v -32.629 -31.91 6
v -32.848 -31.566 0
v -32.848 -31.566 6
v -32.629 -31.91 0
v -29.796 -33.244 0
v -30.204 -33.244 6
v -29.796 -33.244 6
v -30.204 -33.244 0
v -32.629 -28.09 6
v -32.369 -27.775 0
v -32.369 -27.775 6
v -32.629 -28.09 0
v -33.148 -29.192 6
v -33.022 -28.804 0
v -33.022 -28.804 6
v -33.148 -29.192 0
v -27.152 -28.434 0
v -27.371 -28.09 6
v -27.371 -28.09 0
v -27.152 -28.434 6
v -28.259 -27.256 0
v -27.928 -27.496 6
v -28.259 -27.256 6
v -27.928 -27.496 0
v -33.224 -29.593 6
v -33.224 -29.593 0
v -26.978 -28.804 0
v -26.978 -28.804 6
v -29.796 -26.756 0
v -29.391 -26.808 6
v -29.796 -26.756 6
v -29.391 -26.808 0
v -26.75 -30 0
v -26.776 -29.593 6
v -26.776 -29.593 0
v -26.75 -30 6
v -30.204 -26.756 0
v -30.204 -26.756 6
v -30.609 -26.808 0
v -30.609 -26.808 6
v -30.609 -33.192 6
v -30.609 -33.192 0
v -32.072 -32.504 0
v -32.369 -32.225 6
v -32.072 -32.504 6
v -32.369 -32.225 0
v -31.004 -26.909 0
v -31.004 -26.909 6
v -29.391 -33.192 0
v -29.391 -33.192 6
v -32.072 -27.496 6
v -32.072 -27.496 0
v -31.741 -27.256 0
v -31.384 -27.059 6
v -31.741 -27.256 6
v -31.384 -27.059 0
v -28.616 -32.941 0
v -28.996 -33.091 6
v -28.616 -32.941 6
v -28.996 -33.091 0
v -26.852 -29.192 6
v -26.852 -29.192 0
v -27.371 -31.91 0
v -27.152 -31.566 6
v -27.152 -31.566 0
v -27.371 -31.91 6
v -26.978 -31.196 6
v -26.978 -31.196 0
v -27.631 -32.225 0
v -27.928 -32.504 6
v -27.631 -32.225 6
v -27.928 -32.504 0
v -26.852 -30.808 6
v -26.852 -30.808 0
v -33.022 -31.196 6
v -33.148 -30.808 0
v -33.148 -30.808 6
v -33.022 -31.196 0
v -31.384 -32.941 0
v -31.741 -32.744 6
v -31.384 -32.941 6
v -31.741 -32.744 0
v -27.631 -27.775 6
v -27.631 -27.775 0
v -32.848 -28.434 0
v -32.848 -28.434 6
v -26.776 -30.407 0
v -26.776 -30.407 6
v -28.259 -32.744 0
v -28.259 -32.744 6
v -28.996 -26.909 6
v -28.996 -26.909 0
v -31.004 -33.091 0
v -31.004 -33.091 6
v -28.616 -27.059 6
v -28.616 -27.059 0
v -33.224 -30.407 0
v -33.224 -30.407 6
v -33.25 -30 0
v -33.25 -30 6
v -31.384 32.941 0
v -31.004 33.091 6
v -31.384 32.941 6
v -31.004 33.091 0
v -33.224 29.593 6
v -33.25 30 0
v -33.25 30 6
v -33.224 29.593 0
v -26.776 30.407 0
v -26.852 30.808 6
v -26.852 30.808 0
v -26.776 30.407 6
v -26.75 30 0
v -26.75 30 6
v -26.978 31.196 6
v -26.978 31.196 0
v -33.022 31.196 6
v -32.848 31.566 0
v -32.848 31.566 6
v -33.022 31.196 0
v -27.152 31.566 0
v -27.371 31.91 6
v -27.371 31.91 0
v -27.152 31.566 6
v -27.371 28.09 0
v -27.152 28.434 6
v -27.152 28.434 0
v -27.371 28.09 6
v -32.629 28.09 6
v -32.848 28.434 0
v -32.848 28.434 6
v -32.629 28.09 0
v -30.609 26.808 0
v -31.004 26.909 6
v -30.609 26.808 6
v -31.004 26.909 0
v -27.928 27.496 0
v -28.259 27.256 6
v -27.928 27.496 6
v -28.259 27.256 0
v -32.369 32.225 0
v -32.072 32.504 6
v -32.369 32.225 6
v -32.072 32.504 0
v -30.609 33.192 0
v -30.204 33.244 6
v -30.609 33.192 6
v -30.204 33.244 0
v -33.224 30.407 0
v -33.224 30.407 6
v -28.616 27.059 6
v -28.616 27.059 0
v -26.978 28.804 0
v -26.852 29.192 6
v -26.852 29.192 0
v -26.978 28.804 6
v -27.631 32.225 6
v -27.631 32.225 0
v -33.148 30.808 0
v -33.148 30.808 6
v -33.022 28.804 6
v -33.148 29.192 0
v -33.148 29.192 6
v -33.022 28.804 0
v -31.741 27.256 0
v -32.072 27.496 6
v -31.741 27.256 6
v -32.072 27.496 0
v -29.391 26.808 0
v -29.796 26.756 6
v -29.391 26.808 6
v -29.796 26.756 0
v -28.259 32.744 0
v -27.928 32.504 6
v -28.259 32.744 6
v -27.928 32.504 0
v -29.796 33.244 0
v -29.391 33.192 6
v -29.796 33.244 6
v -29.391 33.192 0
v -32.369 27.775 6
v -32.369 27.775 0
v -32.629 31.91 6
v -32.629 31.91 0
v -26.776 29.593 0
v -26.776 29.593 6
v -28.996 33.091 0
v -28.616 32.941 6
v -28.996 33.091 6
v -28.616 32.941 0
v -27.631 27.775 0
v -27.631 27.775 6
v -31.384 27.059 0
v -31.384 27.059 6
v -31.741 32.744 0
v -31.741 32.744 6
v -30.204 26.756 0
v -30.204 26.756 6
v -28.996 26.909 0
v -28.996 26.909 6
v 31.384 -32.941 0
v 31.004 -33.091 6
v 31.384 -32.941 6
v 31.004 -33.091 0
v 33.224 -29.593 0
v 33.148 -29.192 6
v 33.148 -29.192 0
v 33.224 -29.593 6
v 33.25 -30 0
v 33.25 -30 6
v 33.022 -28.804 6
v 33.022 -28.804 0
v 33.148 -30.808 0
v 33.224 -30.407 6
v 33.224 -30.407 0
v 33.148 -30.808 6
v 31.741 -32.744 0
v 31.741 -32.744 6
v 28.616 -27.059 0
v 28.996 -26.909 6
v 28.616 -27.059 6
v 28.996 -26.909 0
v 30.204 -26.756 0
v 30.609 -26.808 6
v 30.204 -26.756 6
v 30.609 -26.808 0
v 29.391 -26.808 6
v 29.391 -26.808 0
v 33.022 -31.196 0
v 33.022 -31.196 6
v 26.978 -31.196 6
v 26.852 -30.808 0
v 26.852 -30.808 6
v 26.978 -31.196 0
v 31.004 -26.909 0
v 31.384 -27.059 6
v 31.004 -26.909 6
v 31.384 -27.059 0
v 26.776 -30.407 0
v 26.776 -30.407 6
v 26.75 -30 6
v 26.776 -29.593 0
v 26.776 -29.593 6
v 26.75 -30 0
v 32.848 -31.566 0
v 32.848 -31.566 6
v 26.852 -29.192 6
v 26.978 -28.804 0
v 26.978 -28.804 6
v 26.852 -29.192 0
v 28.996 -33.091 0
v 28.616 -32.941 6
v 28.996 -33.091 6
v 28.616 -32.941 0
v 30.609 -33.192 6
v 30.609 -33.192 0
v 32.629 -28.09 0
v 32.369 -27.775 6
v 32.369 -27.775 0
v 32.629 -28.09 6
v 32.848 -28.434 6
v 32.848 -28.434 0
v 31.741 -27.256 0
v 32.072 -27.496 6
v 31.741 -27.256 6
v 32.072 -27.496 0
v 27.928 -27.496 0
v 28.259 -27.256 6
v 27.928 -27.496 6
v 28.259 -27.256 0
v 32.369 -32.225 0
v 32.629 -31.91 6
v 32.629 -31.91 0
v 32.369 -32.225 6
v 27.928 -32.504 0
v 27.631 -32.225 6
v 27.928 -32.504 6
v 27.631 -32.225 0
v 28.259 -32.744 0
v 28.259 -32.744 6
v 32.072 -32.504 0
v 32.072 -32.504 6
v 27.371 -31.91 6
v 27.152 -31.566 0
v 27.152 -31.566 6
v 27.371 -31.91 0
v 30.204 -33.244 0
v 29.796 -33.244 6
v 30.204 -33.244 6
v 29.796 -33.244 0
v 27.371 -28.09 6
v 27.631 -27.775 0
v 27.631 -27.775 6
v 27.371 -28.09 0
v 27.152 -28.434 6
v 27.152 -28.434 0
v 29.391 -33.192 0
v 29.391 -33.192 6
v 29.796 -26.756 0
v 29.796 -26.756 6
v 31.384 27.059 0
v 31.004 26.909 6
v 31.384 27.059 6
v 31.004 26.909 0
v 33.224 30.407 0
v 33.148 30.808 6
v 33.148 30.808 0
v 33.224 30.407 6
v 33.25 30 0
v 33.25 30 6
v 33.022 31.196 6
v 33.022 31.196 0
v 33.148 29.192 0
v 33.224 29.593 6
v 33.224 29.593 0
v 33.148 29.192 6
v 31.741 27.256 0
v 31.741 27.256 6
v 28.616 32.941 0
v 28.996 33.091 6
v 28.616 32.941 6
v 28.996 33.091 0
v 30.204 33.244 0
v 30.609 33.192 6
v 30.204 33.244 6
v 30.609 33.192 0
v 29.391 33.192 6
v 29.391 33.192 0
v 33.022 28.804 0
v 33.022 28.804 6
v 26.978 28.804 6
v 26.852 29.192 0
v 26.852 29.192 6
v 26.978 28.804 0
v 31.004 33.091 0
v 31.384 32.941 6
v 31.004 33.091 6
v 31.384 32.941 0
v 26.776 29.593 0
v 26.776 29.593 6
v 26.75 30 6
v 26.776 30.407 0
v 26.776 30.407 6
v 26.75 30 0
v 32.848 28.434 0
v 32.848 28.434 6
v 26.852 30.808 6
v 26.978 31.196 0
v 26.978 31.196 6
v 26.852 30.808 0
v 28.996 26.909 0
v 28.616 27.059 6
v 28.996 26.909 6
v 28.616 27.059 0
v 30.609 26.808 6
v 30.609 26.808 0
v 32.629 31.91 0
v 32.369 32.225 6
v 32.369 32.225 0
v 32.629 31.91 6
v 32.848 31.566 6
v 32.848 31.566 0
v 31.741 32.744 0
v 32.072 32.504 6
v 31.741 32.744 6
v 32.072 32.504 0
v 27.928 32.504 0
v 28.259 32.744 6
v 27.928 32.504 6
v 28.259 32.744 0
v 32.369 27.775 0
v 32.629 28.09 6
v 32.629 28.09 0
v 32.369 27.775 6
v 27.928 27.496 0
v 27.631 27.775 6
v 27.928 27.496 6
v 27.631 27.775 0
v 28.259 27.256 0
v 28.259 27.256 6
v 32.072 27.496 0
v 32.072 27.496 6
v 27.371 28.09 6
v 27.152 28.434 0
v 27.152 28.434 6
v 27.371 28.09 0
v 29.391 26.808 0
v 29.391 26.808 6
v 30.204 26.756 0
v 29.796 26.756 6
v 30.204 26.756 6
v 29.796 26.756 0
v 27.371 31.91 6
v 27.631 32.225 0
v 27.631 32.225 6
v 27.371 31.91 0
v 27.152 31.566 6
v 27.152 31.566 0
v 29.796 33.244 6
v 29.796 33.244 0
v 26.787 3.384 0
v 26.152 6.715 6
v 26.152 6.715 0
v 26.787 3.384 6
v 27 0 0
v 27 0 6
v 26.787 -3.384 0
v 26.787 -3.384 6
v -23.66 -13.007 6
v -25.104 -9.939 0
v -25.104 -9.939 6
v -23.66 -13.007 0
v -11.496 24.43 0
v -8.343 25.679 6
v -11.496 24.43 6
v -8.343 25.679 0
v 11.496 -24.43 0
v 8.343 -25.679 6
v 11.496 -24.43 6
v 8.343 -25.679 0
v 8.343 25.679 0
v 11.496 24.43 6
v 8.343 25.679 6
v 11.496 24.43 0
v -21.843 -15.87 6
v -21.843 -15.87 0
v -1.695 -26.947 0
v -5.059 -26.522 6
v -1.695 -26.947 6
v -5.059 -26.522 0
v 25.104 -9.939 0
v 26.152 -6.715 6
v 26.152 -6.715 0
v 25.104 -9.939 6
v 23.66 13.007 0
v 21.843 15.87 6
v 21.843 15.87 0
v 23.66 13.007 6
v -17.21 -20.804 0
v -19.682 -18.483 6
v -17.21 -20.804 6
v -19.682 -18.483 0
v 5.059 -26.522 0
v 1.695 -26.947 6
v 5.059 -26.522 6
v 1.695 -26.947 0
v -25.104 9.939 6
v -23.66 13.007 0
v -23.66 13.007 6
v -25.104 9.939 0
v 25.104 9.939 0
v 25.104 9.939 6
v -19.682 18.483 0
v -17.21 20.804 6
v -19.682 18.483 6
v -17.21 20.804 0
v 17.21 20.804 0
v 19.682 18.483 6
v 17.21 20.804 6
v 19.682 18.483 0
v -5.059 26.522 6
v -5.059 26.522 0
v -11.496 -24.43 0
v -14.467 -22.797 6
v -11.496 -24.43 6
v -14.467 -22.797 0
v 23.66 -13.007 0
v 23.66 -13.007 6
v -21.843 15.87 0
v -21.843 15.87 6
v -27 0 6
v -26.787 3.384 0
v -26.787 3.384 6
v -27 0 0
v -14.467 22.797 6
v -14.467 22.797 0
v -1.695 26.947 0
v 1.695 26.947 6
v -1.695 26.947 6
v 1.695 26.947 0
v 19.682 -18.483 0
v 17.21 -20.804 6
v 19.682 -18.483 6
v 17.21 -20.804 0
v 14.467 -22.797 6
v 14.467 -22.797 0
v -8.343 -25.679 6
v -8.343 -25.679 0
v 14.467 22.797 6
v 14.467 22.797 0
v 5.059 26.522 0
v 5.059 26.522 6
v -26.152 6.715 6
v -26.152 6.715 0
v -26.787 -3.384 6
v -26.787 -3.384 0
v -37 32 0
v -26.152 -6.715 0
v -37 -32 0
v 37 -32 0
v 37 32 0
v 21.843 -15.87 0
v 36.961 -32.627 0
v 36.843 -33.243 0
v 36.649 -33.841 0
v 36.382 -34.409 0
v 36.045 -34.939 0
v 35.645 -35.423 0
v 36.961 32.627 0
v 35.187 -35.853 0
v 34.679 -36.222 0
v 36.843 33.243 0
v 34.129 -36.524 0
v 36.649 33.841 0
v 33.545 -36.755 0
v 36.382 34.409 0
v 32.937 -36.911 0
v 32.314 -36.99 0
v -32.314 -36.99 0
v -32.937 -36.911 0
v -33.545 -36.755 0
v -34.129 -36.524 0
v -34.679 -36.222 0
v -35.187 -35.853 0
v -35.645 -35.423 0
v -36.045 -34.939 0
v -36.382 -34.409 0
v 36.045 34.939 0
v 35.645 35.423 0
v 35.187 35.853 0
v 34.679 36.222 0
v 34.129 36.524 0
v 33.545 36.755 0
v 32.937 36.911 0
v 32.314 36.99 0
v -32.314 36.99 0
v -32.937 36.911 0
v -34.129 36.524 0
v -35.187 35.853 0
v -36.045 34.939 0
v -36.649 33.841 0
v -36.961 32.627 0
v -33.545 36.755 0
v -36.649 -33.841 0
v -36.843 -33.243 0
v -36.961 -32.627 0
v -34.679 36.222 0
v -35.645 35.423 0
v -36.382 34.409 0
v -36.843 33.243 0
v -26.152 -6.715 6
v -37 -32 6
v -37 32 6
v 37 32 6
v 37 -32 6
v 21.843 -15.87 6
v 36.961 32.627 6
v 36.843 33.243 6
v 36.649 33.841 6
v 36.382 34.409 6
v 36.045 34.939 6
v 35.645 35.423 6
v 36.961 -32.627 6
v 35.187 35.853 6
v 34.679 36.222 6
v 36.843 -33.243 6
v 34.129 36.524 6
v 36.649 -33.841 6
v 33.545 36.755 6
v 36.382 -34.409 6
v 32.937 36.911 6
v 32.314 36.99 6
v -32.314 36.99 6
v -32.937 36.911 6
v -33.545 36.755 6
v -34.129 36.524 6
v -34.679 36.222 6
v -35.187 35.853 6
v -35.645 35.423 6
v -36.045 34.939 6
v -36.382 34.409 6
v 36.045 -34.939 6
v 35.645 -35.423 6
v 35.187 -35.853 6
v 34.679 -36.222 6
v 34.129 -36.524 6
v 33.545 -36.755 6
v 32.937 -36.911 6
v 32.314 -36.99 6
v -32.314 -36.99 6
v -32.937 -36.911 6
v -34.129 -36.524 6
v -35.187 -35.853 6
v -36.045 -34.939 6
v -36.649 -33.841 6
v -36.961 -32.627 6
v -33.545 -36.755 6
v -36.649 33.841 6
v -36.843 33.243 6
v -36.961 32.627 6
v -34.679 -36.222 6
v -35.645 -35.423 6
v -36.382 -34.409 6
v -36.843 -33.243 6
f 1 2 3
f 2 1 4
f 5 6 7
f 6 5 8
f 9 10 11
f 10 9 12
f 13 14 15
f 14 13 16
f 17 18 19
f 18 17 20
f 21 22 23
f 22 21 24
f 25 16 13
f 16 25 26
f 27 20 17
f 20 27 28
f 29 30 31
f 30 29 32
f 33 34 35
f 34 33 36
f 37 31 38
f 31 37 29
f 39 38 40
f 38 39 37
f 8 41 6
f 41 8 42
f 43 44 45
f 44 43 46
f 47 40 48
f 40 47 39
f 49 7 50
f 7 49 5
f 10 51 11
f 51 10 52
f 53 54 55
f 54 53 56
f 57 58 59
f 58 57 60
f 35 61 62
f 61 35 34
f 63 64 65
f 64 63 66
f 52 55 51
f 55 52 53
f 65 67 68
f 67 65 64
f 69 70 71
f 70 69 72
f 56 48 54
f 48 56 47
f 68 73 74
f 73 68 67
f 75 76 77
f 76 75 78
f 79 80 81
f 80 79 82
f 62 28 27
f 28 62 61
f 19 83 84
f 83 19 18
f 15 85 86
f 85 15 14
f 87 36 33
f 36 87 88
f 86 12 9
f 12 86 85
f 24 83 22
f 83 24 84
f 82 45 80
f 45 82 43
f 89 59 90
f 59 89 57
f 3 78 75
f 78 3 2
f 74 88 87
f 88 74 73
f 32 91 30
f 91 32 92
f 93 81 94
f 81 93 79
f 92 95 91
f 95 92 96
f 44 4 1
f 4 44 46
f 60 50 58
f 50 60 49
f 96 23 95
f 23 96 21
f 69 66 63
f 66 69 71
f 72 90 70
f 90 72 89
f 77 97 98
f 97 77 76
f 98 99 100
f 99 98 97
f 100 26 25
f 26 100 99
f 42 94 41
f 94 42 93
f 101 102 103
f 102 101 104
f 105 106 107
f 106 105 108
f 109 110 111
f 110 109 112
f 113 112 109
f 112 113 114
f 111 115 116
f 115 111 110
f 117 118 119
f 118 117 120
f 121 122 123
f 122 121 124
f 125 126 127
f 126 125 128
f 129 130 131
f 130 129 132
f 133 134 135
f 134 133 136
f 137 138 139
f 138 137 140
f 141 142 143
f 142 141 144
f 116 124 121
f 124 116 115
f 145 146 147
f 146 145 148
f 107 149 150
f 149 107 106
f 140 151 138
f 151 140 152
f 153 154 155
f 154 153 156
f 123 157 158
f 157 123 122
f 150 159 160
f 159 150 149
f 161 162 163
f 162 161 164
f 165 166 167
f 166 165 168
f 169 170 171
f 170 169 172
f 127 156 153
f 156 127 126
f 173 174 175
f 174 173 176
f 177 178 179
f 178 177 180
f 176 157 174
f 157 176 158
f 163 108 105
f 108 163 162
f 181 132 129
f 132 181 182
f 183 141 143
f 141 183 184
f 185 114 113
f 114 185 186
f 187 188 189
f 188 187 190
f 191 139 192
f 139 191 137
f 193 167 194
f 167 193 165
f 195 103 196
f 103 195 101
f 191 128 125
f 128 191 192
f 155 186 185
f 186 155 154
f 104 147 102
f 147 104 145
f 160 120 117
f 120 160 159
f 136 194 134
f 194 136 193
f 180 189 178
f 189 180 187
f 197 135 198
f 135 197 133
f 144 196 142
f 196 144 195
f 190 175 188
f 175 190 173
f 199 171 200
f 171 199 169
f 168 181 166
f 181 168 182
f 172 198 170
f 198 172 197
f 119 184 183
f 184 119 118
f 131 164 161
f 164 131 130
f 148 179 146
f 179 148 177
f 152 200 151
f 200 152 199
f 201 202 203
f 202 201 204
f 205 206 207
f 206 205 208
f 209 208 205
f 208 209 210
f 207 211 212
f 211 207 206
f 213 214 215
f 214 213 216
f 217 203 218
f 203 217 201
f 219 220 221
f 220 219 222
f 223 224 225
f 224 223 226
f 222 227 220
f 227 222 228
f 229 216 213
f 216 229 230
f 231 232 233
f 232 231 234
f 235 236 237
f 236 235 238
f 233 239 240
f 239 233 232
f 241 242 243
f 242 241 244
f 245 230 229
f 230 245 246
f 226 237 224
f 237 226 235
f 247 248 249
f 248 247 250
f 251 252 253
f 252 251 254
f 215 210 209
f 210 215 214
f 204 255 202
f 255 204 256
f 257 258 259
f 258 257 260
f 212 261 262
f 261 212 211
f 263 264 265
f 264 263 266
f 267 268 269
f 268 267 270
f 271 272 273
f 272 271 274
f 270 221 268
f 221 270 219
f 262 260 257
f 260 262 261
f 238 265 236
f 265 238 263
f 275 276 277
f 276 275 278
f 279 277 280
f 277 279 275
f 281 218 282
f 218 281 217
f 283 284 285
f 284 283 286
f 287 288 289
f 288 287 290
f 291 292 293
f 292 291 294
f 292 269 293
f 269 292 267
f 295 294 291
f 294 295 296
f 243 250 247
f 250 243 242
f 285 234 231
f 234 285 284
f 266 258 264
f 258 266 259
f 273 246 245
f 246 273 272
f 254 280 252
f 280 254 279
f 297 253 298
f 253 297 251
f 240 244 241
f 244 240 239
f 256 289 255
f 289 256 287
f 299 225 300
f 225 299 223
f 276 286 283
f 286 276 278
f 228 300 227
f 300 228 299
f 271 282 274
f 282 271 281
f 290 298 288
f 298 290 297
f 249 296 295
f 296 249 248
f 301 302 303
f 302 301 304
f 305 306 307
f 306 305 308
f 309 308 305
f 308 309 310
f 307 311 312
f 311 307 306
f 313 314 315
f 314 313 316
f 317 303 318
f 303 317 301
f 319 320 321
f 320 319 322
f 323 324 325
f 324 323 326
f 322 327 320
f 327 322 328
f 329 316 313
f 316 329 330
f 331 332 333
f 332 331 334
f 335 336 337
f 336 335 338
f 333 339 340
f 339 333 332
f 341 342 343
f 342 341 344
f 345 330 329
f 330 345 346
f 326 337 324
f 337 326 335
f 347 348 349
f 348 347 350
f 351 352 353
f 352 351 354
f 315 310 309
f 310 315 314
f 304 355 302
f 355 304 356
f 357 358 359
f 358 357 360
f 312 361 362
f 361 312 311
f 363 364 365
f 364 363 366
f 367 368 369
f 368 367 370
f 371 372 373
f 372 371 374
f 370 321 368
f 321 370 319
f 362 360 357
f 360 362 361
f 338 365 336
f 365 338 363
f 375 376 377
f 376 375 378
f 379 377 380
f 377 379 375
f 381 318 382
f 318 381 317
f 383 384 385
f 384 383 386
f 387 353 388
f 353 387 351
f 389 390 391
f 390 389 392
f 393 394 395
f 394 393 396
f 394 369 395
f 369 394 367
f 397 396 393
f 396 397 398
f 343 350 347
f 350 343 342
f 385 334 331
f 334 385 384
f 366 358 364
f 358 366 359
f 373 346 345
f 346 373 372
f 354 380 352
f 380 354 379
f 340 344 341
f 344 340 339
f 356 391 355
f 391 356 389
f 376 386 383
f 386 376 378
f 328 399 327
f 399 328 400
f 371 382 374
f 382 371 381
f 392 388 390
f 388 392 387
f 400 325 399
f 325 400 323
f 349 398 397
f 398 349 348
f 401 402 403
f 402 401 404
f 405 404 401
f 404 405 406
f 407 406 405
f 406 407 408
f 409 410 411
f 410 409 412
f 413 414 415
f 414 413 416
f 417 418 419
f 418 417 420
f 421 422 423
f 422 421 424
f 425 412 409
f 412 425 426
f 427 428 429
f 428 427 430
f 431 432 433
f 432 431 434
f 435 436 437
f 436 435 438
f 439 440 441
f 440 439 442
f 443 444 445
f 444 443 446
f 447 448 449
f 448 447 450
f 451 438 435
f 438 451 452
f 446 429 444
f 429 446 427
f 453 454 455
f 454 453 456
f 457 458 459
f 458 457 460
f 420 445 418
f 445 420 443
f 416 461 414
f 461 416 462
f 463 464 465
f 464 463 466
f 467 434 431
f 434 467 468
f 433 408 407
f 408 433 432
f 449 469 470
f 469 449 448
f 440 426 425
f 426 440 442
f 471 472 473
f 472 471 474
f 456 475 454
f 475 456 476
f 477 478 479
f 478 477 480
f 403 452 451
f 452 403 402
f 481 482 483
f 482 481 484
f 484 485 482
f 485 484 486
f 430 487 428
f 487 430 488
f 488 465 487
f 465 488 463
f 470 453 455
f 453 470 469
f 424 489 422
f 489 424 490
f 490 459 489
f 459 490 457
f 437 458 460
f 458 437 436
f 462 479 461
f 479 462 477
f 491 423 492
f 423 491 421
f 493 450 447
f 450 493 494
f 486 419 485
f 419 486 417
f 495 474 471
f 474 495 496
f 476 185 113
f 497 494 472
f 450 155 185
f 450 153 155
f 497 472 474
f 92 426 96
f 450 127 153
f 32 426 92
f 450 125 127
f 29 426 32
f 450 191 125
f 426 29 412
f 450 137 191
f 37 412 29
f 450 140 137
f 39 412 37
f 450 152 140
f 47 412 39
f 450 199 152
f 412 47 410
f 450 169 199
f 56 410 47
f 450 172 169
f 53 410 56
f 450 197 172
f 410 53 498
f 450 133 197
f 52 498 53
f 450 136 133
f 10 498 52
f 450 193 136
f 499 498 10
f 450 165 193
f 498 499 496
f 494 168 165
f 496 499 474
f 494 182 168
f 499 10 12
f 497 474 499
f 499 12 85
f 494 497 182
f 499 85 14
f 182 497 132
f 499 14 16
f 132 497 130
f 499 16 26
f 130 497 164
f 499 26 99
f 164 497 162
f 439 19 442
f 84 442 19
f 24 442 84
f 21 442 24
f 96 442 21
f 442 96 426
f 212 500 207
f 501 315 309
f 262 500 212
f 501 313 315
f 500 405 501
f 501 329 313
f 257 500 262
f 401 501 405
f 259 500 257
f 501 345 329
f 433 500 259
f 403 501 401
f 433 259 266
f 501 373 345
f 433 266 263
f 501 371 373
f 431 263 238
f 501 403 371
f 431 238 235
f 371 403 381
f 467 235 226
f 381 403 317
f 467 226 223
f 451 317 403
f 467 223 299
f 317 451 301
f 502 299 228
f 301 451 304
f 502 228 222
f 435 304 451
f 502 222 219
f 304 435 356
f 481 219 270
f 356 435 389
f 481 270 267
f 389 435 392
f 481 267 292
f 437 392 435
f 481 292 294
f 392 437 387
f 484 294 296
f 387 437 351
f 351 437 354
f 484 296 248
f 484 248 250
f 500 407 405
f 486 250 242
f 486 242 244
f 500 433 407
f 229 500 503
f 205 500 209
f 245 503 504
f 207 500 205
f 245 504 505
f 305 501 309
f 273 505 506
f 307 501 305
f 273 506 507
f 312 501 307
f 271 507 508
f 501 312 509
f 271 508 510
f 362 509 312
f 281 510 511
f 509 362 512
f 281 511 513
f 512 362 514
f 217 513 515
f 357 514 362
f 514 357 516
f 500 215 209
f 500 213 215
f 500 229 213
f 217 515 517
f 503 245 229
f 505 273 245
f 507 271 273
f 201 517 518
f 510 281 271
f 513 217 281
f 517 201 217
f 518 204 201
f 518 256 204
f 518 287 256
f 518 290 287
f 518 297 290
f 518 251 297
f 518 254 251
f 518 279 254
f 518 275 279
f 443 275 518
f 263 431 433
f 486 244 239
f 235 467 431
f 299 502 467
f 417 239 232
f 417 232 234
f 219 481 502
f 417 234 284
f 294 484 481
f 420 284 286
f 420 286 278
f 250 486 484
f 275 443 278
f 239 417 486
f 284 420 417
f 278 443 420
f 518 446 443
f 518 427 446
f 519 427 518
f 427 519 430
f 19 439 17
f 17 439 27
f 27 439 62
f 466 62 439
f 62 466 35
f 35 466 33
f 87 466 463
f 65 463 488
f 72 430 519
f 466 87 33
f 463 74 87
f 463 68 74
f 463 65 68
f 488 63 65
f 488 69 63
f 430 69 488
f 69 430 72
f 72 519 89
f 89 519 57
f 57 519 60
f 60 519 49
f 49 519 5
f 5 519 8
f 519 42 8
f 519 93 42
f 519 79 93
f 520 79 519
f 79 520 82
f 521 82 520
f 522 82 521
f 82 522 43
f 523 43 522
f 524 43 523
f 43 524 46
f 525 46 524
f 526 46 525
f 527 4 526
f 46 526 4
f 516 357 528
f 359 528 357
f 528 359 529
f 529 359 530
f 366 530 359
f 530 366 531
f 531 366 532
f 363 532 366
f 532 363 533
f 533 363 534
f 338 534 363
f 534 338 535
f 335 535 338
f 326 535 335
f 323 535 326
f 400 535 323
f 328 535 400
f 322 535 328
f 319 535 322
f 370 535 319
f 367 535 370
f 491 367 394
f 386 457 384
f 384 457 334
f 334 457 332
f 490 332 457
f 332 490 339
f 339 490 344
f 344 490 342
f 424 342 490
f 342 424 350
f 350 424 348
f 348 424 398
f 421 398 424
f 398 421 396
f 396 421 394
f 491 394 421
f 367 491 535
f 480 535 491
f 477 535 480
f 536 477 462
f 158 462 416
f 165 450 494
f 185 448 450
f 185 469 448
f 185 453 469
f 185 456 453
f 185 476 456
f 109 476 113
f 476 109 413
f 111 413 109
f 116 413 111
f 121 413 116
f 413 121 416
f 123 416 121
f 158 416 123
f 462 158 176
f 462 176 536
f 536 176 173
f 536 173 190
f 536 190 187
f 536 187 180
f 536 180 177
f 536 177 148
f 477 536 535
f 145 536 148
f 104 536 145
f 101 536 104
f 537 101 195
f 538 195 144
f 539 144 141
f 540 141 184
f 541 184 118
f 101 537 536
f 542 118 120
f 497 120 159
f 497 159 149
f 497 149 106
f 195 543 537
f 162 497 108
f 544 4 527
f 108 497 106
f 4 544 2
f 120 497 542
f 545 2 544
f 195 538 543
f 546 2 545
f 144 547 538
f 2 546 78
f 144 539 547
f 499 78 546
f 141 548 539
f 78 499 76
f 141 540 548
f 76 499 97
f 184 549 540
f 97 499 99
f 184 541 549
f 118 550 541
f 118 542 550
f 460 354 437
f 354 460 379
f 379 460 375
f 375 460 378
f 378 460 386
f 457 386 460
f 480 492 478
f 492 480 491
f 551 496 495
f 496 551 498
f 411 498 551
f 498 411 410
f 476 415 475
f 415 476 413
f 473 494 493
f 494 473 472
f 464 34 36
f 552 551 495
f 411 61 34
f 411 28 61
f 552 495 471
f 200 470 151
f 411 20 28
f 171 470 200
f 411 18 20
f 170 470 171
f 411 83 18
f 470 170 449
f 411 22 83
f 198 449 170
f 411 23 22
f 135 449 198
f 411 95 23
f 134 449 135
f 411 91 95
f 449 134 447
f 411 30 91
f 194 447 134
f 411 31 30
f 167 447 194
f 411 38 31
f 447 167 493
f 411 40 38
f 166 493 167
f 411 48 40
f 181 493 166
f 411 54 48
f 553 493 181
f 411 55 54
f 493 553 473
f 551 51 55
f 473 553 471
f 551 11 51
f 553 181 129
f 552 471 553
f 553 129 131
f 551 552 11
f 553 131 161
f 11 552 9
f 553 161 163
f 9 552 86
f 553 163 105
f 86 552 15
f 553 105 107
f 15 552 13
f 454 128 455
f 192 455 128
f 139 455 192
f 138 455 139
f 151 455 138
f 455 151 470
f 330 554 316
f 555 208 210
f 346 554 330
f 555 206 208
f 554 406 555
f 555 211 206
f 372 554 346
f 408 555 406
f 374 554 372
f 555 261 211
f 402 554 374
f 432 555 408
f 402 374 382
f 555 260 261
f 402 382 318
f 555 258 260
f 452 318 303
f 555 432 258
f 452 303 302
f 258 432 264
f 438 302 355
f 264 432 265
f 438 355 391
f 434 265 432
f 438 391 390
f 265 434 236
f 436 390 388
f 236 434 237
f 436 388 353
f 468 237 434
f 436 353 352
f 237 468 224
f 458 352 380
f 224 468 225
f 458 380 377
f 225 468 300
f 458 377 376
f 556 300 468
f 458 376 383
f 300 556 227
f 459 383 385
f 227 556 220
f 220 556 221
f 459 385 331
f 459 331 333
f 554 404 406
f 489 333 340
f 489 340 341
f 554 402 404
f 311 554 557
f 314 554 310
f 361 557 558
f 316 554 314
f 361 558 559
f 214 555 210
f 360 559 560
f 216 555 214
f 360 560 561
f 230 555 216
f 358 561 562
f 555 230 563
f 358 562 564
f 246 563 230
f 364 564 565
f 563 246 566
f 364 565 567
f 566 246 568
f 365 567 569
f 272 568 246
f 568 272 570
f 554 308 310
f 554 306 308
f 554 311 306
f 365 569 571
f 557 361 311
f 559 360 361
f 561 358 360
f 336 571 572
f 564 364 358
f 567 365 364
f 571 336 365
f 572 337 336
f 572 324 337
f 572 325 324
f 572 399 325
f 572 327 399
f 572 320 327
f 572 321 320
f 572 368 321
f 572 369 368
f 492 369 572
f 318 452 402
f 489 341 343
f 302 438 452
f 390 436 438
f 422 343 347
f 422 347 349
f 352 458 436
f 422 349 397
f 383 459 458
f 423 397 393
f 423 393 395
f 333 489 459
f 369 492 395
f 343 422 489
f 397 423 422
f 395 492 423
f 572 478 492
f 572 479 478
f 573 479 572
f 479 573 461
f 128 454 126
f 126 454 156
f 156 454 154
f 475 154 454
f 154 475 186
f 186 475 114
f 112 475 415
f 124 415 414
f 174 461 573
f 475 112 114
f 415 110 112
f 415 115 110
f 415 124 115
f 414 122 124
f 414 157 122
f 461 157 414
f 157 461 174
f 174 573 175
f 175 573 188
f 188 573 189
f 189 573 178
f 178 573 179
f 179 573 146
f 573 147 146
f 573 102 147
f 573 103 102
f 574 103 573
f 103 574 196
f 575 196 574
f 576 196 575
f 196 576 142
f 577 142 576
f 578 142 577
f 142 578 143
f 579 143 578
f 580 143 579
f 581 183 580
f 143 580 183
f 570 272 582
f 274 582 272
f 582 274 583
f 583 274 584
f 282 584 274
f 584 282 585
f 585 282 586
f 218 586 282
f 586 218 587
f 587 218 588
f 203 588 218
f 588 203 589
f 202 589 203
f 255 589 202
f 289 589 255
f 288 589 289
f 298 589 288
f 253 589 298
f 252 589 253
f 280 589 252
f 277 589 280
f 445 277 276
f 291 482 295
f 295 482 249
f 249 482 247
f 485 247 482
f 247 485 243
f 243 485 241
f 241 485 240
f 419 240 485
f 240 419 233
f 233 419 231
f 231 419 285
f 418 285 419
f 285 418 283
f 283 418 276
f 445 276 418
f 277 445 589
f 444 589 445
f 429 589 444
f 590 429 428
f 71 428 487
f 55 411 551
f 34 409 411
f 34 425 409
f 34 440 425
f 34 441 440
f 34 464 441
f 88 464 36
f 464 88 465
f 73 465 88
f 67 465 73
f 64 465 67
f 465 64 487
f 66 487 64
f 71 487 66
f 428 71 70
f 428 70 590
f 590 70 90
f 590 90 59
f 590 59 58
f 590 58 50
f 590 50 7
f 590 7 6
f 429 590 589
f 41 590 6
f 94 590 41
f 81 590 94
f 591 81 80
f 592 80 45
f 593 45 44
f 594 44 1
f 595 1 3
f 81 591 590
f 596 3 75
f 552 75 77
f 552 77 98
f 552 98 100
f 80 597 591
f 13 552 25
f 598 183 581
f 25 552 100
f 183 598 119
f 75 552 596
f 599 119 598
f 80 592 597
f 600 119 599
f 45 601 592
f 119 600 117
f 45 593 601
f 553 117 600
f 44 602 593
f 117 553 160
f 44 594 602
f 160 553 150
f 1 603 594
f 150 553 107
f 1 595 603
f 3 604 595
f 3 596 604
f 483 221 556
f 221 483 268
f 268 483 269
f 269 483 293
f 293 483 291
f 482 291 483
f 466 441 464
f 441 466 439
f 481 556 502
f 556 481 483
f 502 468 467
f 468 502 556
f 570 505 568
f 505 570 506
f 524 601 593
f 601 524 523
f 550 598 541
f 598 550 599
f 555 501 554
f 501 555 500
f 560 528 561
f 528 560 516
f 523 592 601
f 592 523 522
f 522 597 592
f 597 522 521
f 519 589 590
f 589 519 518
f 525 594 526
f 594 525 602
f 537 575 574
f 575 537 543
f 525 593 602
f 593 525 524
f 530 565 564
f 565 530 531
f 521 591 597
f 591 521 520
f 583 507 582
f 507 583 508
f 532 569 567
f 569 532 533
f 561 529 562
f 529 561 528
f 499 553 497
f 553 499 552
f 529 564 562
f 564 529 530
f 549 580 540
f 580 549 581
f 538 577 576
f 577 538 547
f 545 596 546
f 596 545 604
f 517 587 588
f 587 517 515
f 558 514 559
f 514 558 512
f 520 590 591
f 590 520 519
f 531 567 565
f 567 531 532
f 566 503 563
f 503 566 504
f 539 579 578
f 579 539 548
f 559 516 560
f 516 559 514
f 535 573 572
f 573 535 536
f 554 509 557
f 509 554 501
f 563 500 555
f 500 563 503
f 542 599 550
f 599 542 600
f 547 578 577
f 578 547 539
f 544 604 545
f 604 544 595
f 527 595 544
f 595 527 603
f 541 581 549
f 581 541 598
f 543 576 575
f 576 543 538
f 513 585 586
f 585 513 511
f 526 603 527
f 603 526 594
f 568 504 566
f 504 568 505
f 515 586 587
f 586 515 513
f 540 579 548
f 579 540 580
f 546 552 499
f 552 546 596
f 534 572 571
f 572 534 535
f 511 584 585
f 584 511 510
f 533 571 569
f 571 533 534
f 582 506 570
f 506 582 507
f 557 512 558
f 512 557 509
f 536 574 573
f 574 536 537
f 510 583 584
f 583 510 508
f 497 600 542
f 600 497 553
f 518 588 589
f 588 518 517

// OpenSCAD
$fn = 50;


difference() {
	union() {
		hull() {
			translate(v = [-32.0000000000, 32.0000000000, 0]) {
				cylinder(h = 6, r = 5);
			}
			translate(v = [32.0000000000, 32.0000000000, 0]) {
				cylinder(h = 6, r = 5);
			}
			translate(v = [-32.0000000000, -32.0000000000, 0]) {
				cylinder(h = 6, r = 5);
			}
			translate(v = [32.0000000000, -32.0000000000, 0]) {
				cylinder(h = 6, r = 5);
			}
		}
	}
	union() {
		#translate(v = [-30.0000000000, -30.0000000000, -100.0000000000]) {
			cylinder(h = 200, r = 3.2500000000);
		}
		#translate(v = [-30.0000000000, 30.0000000000, -100.0000000000]) {
			cylinder(h = 200, r = 3.2500000000);
		}
		#translate(v = [30.0000000000, -30.0000000000, -100.0000000000]) {
			cylinder(h = 200, r = 3.2500000000);
		}
		#translate(v = [30.0000000000, 30.0000000000, -100.0000000000]) {
			cylinder(h = 200, r = 3.2500000000);
		}
		#cylinder(h = 6, r = 27.0000000000);
	}
}
